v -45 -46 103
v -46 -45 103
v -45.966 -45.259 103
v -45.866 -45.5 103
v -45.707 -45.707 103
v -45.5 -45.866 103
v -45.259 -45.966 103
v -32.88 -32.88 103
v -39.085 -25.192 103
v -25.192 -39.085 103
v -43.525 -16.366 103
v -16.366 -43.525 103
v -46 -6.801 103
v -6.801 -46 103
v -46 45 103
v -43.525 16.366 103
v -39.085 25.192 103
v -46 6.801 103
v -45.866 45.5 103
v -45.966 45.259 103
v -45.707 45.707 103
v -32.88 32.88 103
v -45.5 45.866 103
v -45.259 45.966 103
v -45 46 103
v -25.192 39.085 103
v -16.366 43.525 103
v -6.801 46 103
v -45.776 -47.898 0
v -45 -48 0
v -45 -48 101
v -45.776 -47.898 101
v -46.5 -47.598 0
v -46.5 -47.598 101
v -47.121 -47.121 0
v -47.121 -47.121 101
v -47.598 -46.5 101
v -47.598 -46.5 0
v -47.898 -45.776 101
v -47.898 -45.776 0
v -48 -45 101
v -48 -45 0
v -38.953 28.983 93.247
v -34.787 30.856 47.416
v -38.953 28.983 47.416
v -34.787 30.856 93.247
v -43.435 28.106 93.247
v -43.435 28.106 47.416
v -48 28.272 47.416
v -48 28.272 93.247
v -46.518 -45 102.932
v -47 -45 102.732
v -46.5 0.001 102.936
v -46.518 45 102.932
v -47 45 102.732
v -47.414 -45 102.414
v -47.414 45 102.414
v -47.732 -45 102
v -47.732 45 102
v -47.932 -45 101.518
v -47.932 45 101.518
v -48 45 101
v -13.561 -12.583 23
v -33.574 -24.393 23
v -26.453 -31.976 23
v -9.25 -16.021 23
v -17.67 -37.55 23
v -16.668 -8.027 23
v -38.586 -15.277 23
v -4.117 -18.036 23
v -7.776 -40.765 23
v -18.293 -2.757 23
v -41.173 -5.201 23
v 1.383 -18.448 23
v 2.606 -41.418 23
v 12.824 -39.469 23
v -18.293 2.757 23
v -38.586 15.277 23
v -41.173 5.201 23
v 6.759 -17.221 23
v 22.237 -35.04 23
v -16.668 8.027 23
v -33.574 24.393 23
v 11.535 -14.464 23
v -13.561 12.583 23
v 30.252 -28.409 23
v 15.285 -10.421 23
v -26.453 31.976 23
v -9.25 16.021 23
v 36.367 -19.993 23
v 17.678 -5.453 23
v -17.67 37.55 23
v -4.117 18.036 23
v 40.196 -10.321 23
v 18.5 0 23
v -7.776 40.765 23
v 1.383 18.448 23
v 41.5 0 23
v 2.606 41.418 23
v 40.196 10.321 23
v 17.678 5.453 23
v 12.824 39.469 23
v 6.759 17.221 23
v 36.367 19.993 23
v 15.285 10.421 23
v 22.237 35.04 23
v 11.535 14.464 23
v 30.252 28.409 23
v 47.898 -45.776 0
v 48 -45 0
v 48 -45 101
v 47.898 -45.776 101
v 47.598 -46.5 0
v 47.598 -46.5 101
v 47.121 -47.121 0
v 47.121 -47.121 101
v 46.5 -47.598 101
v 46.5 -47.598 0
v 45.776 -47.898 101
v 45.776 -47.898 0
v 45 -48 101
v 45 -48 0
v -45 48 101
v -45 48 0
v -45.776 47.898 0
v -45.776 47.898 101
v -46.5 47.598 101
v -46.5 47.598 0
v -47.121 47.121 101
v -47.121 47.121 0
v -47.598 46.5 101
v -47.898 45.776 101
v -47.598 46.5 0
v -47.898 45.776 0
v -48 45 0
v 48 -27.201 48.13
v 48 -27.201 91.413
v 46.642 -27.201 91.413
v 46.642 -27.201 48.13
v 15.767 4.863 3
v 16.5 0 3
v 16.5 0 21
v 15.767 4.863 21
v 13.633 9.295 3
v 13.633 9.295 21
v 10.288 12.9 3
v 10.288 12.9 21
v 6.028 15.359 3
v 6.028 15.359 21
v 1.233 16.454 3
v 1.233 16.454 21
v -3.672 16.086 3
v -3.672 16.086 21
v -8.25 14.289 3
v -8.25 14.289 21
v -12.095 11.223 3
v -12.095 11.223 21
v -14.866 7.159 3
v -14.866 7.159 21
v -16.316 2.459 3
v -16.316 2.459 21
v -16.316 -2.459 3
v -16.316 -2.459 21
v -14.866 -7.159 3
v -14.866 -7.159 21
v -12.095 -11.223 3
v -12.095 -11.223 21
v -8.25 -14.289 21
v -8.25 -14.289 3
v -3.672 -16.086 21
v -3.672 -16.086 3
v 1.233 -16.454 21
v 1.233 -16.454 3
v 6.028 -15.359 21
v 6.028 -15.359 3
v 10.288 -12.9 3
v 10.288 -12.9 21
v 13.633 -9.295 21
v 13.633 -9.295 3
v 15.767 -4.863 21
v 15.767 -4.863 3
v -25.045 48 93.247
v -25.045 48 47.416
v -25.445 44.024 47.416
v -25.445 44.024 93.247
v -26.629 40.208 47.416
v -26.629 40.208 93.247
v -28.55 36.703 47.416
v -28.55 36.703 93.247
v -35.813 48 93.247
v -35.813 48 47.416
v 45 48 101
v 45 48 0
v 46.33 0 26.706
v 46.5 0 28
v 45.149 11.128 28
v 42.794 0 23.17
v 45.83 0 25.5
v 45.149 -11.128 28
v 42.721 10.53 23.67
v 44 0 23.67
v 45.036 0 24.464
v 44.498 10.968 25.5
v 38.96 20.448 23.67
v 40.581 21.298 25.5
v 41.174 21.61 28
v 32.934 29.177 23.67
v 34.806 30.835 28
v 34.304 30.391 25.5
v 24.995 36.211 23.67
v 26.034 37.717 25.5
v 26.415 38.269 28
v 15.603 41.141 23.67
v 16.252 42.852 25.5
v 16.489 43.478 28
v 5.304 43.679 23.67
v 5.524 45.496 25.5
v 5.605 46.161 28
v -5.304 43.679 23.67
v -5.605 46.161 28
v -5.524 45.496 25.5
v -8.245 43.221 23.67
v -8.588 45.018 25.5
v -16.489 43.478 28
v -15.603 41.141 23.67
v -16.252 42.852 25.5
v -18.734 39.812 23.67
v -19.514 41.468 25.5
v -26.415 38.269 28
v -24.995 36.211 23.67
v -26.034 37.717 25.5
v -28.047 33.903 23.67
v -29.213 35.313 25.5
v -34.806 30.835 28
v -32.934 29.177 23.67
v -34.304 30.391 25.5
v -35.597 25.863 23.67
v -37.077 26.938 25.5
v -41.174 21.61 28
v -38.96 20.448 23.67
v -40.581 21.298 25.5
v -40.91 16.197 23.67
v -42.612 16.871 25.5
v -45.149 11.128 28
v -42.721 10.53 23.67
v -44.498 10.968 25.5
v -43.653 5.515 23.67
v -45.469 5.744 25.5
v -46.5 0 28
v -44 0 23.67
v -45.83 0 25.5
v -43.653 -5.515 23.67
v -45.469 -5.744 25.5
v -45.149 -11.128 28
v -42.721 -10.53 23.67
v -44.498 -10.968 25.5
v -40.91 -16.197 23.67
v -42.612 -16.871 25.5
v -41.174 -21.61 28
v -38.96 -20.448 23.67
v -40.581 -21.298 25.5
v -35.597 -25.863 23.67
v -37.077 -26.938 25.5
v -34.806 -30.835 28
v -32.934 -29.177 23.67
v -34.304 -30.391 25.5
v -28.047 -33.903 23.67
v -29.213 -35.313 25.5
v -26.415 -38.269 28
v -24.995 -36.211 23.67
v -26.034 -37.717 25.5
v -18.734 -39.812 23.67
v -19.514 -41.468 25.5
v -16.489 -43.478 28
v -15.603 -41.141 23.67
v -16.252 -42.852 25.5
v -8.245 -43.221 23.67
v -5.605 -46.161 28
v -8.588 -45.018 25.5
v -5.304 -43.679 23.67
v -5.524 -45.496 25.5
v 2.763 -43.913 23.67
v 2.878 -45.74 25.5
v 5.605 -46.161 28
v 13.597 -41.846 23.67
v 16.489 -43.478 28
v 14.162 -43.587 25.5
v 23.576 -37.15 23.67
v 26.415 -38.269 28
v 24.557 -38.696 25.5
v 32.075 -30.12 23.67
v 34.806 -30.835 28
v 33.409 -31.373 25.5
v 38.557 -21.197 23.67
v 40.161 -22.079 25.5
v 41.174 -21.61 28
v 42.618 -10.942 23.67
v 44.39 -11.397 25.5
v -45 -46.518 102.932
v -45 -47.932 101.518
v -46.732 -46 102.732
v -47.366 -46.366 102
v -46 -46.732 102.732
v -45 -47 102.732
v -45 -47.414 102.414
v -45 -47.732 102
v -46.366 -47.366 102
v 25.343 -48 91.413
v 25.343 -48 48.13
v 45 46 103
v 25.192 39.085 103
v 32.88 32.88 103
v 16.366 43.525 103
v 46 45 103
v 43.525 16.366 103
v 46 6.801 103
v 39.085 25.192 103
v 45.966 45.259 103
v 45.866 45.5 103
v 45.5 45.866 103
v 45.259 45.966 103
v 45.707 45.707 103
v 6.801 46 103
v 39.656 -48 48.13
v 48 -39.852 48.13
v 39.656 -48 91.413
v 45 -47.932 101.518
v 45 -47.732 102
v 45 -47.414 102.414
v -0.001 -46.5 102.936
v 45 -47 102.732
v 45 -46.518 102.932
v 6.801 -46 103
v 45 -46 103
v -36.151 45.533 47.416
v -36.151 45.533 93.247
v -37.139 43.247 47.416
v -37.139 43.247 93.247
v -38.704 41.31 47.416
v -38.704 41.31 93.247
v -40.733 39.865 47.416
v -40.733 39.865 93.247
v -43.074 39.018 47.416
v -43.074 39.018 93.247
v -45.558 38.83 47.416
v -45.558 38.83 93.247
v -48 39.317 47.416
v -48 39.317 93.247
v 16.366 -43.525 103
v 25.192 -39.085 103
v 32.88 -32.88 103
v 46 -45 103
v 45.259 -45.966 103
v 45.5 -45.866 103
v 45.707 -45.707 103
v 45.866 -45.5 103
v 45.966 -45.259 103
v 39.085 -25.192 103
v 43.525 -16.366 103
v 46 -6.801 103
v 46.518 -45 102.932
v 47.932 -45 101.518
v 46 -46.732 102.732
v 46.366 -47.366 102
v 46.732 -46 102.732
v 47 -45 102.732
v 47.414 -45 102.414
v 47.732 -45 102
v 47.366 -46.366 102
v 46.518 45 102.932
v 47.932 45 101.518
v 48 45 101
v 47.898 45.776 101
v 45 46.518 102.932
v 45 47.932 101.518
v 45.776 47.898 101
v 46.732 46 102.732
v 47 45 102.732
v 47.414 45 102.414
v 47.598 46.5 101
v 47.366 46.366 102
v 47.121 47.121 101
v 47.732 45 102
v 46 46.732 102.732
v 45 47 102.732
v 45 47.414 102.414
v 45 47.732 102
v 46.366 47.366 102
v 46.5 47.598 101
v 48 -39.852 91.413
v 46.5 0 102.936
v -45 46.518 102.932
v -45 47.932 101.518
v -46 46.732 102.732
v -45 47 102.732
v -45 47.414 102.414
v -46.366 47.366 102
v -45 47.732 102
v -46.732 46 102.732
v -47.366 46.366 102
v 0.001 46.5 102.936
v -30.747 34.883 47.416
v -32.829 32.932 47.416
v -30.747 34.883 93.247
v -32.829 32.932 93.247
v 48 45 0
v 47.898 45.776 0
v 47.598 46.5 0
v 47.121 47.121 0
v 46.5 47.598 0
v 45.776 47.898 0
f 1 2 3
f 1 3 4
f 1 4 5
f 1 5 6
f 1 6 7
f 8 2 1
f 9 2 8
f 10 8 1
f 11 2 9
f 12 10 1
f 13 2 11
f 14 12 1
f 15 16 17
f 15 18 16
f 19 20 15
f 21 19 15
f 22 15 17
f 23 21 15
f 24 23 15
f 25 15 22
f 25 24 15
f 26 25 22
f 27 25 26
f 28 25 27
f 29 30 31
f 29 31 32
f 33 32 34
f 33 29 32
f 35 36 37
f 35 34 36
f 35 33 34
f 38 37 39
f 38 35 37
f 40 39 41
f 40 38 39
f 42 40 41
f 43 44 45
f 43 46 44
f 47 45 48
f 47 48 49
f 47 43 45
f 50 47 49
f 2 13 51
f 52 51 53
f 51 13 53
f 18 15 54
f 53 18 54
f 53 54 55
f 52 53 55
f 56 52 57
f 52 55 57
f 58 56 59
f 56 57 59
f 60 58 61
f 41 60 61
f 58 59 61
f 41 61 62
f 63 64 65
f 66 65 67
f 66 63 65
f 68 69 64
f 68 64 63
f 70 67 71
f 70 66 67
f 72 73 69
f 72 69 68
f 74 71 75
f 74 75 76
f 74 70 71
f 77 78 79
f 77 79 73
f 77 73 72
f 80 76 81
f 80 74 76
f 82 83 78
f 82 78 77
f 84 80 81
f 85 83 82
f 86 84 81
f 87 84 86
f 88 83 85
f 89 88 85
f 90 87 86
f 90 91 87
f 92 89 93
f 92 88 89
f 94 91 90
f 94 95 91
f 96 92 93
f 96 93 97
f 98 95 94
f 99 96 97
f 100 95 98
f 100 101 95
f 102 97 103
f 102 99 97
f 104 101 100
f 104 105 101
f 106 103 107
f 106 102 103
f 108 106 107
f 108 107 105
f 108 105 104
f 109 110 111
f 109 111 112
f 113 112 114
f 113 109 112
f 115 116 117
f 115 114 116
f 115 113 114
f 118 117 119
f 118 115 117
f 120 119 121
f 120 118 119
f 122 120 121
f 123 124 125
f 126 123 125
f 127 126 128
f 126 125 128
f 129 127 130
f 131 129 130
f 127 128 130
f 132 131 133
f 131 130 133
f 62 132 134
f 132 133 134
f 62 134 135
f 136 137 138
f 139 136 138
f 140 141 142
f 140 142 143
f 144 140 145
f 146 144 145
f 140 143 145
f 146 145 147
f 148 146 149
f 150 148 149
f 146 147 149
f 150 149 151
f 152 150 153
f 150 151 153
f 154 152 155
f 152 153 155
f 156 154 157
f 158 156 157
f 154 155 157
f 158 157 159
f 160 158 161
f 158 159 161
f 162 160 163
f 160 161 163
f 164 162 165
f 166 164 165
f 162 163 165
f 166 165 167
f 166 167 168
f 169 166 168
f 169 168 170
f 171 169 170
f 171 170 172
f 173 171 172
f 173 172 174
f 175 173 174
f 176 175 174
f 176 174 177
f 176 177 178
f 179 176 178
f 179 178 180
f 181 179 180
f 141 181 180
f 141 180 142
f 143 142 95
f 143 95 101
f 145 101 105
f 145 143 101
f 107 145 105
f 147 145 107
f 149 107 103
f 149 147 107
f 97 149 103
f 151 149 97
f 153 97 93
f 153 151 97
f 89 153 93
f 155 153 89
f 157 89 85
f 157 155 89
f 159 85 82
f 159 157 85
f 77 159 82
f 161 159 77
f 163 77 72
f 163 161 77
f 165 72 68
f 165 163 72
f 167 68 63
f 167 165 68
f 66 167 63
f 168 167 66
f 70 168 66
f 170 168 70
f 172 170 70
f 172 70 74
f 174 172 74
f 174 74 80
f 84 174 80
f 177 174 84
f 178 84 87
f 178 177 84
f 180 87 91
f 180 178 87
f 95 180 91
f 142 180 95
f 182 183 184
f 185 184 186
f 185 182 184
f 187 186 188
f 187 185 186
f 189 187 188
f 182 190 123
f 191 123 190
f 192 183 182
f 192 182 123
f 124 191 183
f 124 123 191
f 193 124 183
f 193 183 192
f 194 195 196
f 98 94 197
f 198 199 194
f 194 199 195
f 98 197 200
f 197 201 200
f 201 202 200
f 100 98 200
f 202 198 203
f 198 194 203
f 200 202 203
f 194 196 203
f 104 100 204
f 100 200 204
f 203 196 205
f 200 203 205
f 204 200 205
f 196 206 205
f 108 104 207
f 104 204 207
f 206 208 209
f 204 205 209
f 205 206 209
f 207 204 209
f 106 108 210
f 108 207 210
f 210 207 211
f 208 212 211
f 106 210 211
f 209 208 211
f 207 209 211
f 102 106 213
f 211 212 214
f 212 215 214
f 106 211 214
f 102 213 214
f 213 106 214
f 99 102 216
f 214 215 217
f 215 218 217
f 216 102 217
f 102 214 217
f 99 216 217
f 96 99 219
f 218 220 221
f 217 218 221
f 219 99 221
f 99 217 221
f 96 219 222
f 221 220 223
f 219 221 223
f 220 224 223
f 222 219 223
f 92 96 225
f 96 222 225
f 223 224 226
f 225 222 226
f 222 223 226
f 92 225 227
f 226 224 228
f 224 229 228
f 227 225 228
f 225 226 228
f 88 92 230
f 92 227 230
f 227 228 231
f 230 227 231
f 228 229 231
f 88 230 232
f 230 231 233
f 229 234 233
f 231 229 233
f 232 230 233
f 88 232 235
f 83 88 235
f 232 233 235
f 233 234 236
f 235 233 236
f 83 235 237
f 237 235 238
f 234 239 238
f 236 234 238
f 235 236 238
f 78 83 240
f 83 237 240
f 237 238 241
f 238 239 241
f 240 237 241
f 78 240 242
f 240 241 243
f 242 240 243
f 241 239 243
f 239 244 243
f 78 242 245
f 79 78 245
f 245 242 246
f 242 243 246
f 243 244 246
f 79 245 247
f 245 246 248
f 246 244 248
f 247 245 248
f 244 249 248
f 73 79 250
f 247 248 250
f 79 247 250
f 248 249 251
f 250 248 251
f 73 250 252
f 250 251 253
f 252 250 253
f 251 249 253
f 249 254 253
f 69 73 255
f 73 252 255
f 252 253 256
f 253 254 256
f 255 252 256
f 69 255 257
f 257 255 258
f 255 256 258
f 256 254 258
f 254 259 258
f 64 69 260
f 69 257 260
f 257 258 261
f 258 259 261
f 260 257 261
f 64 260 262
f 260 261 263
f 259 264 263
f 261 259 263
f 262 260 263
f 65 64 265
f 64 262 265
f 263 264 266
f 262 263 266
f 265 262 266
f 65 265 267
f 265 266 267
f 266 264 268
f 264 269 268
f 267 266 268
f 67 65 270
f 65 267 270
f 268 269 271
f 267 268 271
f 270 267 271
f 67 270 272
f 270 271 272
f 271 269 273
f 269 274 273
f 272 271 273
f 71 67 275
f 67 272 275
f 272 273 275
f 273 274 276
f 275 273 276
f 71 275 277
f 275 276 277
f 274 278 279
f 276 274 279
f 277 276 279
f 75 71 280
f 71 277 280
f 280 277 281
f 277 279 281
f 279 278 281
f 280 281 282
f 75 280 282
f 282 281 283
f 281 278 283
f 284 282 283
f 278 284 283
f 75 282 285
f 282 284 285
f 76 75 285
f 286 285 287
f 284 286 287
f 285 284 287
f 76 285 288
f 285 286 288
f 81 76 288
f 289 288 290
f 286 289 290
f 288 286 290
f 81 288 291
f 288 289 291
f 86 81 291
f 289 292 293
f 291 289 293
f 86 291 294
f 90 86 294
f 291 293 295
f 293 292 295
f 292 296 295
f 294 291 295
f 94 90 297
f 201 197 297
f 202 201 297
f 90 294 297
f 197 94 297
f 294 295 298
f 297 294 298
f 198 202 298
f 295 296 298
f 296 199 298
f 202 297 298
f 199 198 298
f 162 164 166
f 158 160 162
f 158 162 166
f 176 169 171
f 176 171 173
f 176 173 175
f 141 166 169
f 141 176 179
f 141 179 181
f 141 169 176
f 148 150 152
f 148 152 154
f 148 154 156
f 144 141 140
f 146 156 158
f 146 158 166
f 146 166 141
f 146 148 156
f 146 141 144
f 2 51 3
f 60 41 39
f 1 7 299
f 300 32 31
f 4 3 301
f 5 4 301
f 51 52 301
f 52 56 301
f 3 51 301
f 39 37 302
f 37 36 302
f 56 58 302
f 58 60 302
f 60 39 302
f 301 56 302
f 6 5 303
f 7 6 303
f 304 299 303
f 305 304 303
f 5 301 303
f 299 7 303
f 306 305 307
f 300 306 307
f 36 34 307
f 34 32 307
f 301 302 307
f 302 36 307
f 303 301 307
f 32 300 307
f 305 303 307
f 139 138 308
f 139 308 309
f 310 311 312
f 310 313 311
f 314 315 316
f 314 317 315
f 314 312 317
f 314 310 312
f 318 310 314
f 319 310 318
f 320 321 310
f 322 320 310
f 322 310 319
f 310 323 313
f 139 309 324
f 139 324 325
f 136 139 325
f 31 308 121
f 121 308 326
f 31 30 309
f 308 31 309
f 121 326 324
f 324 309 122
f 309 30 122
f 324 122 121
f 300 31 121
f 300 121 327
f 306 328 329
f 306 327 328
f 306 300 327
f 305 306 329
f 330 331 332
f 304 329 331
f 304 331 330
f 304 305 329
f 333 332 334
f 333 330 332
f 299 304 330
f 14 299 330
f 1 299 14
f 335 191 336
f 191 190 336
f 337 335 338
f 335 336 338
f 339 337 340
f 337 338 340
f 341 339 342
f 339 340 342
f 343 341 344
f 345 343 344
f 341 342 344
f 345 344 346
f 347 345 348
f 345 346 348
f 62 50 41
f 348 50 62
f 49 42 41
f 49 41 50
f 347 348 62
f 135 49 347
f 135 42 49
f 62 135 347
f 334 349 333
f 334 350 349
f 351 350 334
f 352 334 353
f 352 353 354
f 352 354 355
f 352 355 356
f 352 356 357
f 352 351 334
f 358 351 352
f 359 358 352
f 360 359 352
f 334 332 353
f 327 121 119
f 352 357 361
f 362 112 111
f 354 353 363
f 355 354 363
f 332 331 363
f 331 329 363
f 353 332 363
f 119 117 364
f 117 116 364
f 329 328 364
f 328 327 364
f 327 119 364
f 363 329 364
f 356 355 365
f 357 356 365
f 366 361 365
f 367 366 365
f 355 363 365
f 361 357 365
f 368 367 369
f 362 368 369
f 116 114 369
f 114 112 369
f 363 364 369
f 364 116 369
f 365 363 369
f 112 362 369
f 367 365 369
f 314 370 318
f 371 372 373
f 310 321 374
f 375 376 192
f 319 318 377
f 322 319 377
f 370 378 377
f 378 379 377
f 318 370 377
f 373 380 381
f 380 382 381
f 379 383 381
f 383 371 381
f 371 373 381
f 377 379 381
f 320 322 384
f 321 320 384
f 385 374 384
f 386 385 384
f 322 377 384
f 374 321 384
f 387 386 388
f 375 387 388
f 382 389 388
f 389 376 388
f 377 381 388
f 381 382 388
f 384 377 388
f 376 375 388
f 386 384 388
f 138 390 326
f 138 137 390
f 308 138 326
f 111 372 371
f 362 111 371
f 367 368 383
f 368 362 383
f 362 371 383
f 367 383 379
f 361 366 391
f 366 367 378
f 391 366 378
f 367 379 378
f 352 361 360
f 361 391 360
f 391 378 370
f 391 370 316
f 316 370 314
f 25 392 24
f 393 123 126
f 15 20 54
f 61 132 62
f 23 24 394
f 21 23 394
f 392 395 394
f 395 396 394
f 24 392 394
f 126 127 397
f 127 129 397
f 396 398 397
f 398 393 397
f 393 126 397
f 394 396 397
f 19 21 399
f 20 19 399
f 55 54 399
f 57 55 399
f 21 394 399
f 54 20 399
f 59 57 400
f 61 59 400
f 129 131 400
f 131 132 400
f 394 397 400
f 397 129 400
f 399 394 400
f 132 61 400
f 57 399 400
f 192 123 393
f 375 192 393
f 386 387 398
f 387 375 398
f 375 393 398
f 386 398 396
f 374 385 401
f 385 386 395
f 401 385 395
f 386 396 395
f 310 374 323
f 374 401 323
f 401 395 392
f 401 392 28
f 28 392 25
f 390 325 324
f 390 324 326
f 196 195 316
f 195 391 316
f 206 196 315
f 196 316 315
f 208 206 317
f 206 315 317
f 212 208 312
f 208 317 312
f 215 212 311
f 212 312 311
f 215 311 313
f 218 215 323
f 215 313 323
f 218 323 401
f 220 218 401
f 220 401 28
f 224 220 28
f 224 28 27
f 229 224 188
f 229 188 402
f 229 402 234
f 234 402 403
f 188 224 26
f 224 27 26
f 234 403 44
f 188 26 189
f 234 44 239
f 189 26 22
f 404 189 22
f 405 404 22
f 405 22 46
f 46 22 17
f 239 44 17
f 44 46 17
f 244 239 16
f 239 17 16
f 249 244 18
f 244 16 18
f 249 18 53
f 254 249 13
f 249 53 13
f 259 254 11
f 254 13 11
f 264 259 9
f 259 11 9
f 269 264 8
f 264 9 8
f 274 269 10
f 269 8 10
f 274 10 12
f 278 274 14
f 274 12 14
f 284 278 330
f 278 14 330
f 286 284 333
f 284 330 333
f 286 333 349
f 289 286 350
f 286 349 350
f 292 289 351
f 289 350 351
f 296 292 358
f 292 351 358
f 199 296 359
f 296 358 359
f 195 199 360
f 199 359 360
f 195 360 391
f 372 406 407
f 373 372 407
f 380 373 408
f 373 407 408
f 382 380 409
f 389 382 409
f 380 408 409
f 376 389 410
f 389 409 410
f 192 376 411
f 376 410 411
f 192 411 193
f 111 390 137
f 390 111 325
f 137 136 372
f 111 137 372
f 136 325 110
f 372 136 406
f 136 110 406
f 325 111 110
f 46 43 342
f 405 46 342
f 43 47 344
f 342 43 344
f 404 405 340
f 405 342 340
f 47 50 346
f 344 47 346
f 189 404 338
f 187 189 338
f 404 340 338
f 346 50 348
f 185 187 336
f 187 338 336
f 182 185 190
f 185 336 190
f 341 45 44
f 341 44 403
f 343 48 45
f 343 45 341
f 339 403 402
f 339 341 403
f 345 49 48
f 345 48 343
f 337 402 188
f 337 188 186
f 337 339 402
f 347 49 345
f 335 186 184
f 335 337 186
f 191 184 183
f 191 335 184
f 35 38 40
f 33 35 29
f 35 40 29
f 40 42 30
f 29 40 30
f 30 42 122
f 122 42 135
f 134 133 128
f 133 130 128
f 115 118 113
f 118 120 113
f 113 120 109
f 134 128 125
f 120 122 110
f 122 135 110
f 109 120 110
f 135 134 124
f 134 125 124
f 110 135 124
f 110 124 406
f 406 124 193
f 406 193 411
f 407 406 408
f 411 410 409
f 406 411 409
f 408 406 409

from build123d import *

# Parameters (mm, degrees)
F0_W         = 96
F0_H         = 96
F1_DEPTH     = 103
F2_R         = 16.5
F3_DEPTH     = 100
F4_R         = 46.5
F5_DEPTH     = 80
F6_T1_DEPTH  = 106
F6_T3_DEPTH  = 106
F7_T1_DEPTH  = 110.4999999999
F7_T4_ANGLE  = 90
F7_T6_ANGLE  = 90
F7_T8_ANGLE  = 90
F7_T10_ANGLE = 90
F9_SIZE      = 2
F8_W         = 14.3129900098
F8_H         = 43.2826243341
F12_R        = 5
F13_W        = 11.0455658287
F13_H        = 45.8308011293


# Not quite as in the source:
# - a fillet or chamfer that OpenCascade refuses, or shapes differently, is made with other operations: its cross-section is extruded or revolved along the edge and cut away or added


with BuildPart() as f1:
    # F0 (on Top) → F1 (new body)
    with BuildSketch(Plane.XY):
        Rectangle(F0_W, F0_H)
    extrude(amount=F1_DEPTH)

    # F2 (on face) → F3 (cut)
    with BuildSketch(Plane.XY.offset(103)):
        Circle(F2_R)
    extrude(amount=-F3_DEPTH, mode=Mode.SUBTRACT)

    # F4 (on face) → F5 (cut)
    with BuildSketch(Plane.XY.offset(103)):
        Circle(F4_R)
    extrude(amount=-F5_DEPTH, mode=Mode.SUBTRACT)

    # F6: fillet of radius 2 on 4 edges, made by hand

    # F6_s2 → F6_t1 (cut)
    with BuildSketch(Plane.YZ.offset(-53)):
        with BuildLine():
            ThreePointArc((48, 101), (47.4142135624, 102.4142135624), (46, 103))
            Line((46, 103), (48, 103))
            Line((48, 103), (48, 101))
        make_face()
        with BuildLine():
            ThreePointArc((-48, 101), (-47.4142135624, 102.4142135624), (-46, 103))
            Line((-46, 103), (-48, 103))
            Line((-48, 103), (-48, 101))
        make_face()
    extrude(amount=F6_T1_DEPTH, mode=Mode.SUBTRACT)

    # F6_s4 → F6_t3 (cut)
    with BuildSketch(Plane.XZ.offset(-53)):
        with BuildLine():
            ThreePointArc((48, 101), (47.4142135624, 102.4142135624), (46, 103))
            Line((46, 103), (48, 103))
            Line((48, 103), (48, 101))
        make_face()
        with BuildLine():
            ThreePointArc((-46, 103), (-47.4142135624, 102.4142135624), (-48, 101))
            Line((-48, 101), (-48, 103))
            Line((-48, 103), (-46, 103))
        make_face()
    extrude(amount=F6_T3_DEPTH, mode=Mode.SUBTRACT)

    # F7: fillet of radius 3 on 4 edges, made by hand

    # F7_s2 → F7_t1 (cut)
    with BuildSketch(Plane.XY.offset(-7.5)):
        with BuildLine():
            ThreePointArc((48, -45), (47.1213203436, -47.1213203436), (45, -48))
            Line((45, -48), (48, -48))
            Line((48, -48), (48, -45))
        make_face()
        with BuildLine():
            ThreePointArc((-45, -48), (-47.1213203436, -47.1213203436), (-48, -45))
            Line((-48, -45), (-48, -48))
            Line((-48, -48), (-45, -48))
        make_face()
        with BuildLine():
            ThreePointArc((-45, 48), (-47.1213203436, 47.1213203436), (-48, 45))
            Line((-48, 45), (-48, 48))
            Line((-48, 48), (-45, 48))
        make_face()
        with BuildLine():
            ThreePointArc((48, 45), (47.1213203436, 47.1213203436), (45, 48))
            Line((45, 48), (48, 48))
            Line((48, 48), (48, 45))
        make_face()
    extrude(amount=F7_T1_DEPTH, mode=Mode.SUBTRACT)

    # F7_s3 → F7_t4 (revolve, cut)
    with BuildSketch(Plane.XZ.offset(-45)):
        with BuildLine():
            ThreePointArc((46.0000000001, 103), (47.4142135624, 102.4142135624), (48, 101.0000000001))
            Line((48, 101.0000000001), (48, 103))
            Line((48, 103), (46.0000000001, 103))
        make_face()
    revolve(axis=Axis((45, 45, 103), (0, 0, 1)), revolution_arc=F7_T4_ANGLE, mode=Mode.SUBTRACT)

    # F7_s5 → F7_t6 (revolve, cut)
    with BuildSketch(Plane.YZ.offset(-45)):
        with BuildLine():
            ThreePointArc((46.0000000001, 103), (47.4142135624, 102.4142135624), (48, 101.0000000001))
            Line((48, 101.0000000001), (48, 103))
            Line((48, 103), (46.0000000001, 103))
        make_face()
    revolve(axis=Axis((-45, 45, 103), (0, 0, 1)), revolution_arc=F7_T6_ANGLE, mode=Mode.SUBTRACT)

    # F7_s7 → F7_t8 (revolve, cut)
    with BuildSketch(Plane.XZ.offset(45)):
        with BuildLine():
            ThreePointArc((-46.0000000001, 103), (-47.4142135624, 102.4142135624), (-48, 101.0000000001))
            Line((-48, 101.0000000001), (-48, 103))
            Line((-48, 103), (-46.0000000001, 103))
        make_face()
    revolve(axis=Axis((-45, -45, 103), (0, 0, 1)), revolution_arc=F7_T8_ANGLE, mode=Mode.SUBTRACT)

    # F7_s9 → F7_t10 (revolve, cut)
    with BuildSketch(Plane.YZ.offset(45)):
        with BuildLine():
            ThreePointArc((-46.0000000001, 103), (-47.4142135624, 102.4142135624), (-48, 101.0000000001))
            Line((-48, 101.0000000001), (-48, 103))
            Line((-48, 103), (-46.0000000001, 103))
        make_face()
    revolve(axis=Axis((45, -45, 103), (0, 0, 1)), revolution_arc=F7_T10_ANGLE, mode=Mode.SUBTRACT)

    # F9
    f9_edges = [f1.edges().sort_by_distance(p)[0] for p in [
        (-16.5, 0, 23),
    ]]
    chamfer(f9_edges, length=F9_SIZE)

    # F11: sweep along a path in F10
    with BuildLine(Plane.XY.offset(23)) as f11_path:
        Line((27.1213203436, -47.9204392359), (48.4205447137, -27.1213203436))
    # F8 (on face) → F11 (sweep, cut)
    with BuildSketch(Plane.XZ.offset(48)):
        with Locations((32.499153167, 69.7716791183)):
            Rectangle(F8_W, F8_H)
    sweep(path=f11_path.line, mode=Mode.SUBTRACT)

    # F12
    f12_edges = [f1.edges().sort_by_distance(p)[0] for p in [
        (-46.5, 0, 23),
    ]]
    fillet(f12_edges, radius=F12_R)

    # F13 (on face) → F14 (revolve, cut)
    with BuildSketch(Plane(origin=(-48, 0, 0), x_dir=(0, -1, 0), z_dir=(-1, 0, 0))):
        with Locations((-33.7943071499, 70.3311860561)):
            Rectangle(F13_W, F13_H)
    revolve(axis=Axis((-45, 48, 50.5), (0, 0, -1)), mode=Mode.SUBTRACT)


solid = f1.part
